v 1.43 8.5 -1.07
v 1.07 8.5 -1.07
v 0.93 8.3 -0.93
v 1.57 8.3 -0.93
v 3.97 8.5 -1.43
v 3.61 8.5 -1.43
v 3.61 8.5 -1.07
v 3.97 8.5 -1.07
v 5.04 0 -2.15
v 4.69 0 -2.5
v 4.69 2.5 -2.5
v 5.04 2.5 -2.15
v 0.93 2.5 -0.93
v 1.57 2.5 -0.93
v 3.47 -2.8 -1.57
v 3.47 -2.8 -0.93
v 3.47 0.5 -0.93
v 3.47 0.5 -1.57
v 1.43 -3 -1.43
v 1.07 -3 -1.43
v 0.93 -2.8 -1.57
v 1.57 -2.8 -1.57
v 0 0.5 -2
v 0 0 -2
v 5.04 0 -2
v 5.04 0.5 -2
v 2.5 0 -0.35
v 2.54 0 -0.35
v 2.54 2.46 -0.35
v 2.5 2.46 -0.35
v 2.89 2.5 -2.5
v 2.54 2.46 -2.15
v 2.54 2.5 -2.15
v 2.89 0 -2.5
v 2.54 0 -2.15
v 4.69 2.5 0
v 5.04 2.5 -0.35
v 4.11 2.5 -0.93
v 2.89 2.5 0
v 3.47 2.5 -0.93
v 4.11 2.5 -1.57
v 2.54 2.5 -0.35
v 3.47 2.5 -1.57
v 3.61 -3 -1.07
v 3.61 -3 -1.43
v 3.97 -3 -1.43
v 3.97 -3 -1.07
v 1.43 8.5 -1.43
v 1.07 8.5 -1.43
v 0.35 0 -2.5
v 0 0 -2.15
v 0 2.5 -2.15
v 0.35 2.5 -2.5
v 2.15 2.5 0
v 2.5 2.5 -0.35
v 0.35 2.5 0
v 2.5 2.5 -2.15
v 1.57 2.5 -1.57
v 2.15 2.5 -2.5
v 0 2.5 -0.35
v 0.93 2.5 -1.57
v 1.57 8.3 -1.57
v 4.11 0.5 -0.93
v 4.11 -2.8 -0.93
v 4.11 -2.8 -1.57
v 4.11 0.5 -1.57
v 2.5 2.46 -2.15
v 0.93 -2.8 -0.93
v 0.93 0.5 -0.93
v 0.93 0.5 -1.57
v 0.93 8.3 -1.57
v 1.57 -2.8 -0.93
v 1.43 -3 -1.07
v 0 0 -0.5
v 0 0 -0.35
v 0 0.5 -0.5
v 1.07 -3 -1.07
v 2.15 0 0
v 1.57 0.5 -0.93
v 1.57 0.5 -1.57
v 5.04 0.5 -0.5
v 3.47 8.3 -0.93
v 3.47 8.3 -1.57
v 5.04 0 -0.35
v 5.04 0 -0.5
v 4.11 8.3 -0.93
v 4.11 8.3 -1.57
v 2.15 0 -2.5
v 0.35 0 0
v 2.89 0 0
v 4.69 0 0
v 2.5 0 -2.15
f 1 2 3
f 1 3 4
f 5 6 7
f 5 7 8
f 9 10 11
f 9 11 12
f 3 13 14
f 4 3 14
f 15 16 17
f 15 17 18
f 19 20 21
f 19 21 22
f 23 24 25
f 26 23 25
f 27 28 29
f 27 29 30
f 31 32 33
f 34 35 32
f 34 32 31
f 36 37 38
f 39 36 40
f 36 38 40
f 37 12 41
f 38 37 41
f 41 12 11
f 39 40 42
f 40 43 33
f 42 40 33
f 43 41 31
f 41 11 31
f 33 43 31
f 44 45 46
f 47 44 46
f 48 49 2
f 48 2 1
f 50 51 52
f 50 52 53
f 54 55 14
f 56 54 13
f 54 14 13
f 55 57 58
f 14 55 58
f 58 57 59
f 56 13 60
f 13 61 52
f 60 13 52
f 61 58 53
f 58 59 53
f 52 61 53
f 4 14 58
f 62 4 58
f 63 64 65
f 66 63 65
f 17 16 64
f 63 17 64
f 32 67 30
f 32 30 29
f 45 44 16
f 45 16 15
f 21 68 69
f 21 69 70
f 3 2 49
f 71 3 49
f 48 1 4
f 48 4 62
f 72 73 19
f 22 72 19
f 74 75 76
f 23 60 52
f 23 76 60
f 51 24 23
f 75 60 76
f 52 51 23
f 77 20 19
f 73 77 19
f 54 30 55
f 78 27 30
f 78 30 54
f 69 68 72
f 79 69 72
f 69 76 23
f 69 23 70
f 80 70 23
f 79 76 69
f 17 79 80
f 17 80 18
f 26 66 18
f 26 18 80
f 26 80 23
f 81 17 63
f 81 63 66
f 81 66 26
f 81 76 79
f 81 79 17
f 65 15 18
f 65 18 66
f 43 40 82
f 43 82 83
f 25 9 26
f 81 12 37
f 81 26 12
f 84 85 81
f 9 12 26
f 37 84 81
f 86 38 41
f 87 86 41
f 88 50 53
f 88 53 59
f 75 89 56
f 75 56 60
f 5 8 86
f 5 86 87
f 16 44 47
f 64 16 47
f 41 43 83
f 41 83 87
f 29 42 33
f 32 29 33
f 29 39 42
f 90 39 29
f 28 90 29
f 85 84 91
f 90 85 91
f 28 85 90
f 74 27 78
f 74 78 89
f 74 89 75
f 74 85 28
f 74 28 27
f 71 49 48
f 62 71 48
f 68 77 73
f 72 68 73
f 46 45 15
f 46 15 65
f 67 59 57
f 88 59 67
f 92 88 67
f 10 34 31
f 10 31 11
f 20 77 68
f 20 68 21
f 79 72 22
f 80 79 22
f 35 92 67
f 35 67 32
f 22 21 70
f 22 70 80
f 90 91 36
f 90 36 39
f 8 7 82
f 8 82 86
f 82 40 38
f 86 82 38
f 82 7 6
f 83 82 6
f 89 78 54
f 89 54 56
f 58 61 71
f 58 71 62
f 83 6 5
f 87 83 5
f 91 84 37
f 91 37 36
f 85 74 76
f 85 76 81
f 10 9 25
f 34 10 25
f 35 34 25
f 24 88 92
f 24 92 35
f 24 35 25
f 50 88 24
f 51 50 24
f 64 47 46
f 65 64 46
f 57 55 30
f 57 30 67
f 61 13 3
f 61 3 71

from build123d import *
from OCP.BRepFilletAPI import BRepFilletAPI_MakeChamfer

# Parameters (mm, degrees)
BOSS_EXTRUDE1_DEPTH         = 2.5
SKETCH2_W                   = 5.04
SKETCH2_H                   = 1.5
CUT_EXTRUDE1_DEPTH          = 0.5
SKETCH4_W                   = 0.04
SKETCH4_H                   = 1.8
CUT_EXTRUDE2_DEPTH          = 0.04
BOSS_EXTRUDE2_START         = -5.5
SKETCH3_W                   = 0.64
SKETCH3_H                   = 0.64
BOSS_EXTRUDE2_DEPTH         = 11.5
CHAMFER1_SIZE               = 0.2
CHAMFER1_SIZE2              = 0.140041508
LPATTERN1_COUNT             = 2
LPATTERN1_PITCH             = 2.54
CHAMFER1_OF_LPATTERN1_SIZE  = 0.2
CHAMFER1_OF_LPATTERN1_SIZE2 = 0.140041508


with BuildPart() as part:
    # Sketch1 → Boss-Extrude1 (new body)
    with BuildSketch(Plane(origin=(0, 0, 0), x_dir=(1, 0, 0), z_dir=(0, 1, 0))):
        Polygon((0, 2.15), (0.35, 2.5), (2.15, 2.5), (2.5, 2.15), (2.54, 2.15), (2.89, 2.5), (4.69, 2.5), (5.04, 2.15), (5.04, 0.35), (4.69, 0), (2.89, 0), (2.54, 0.35), (2.5, 0.35), (2.15, 0), (0.35, 0), (0, 0.35), align=None)
    extrude(amount=BOSS_EXTRUDE1_DEPTH)

    # Sketch2 → Cut-Extrude1 (cut)
    with BuildSketch(Plane.XZ):
        with Locations((2.52, -1.25)):
            Rectangle(SKETCH2_W, SKETCH2_H)
    extrude(amount=-CUT_EXTRUDE1_DEPTH, mode=Mode.SUBTRACT)

    # Sketch4 → Cut-Extrude2 (cut)
    with BuildSketch(Plane(origin=(0, 2.5, 0), x_dir=(1, 0, 0), z_dir=(0, 1, 0))):
        with Locations((5.06, 1.25)):
            Rectangle(SKETCH4_W, SKETCH4_H)
        with Locations((2.52, 1.25)):
            Rectangle(SKETCH4_W, SKETCH4_H)
        with Locations((7.6, 1.25)):
            Rectangle(SKETCH4_W, SKETCH4_H)
        with Locations((10.14, 1.25)):
            Rectangle(SKETCH4_W, SKETCH4_H)
        with Locations((12.68, 1.25)):
            Rectangle(SKETCH4_W, SKETCH4_H)
        with Locations((15.22, 1.25)):
            Rectangle(SKETCH4_W, SKETCH4_H)
        with Locations((17.76, 1.25)):
            Rectangle(SKETCH4_W, SKETCH4_H)
    extrude(amount=-CUT_EXTRUDE2_DEPTH, mode=Mode.SUBTRACT)

    # Sketch3 → Boss-Extrude2 (add)
    with BuildSketch(Plane(origin=(0, 2.5, 0), x_dir=(1, 0, 0), z_dir=(0, 1, 0)).offset(BOSS_EXTRUDE2_START)):
        with Locations((1.25, 1.25)):
            Rectangle(SKETCH3_W, SKETCH3_H)
    boss_extrude2 = extrude(amount=BOSS_EXTRUDE2_DEPTH)

    # Chamfer1: one chamfer whose edges measure the first distance from different faces: ONE call of the kernel's chamfer builder (chamfer() names one face for all edges)
    chamfer1_edges_1 = [part.edges().sort_by_distance(p)[0] for p in [
        (1.57, -3, -1.25),
    ]]
    chamfer1_side_1 = [part.faces().sort_by_distance(p)[0] for p in [
        (1.57, -1.25, -1.25),
    ]]
    chamfer1_edges_2 = [part.edges().sort_by_distance(p)[0] for p in [
        (1.25, -3, -0.93),
    ]]
    chamfer1_side_2 = [part.faces().sort_by_distance(p)[0] for p in [
        (1.25, -1.25, -0.93),
    ]]
    chamfer1_edges_3 = [part.edges().sort_by_distance(p)[0] for p in [
        (0.93, -3, -1.25),
    ]]
    chamfer1_side_3 = [part.faces().sort_by_distance(p)[0] for p in [
        (0.93, -1.25, -1.25),
    ]]
    chamfer1_edges_4 = [part.edges().sort_by_distance(p)[0] for p in [
        (1.25, -3, -1.57),
    ]]
    chamfer1_side_4 = [part.faces().sort_by_distance(p)[0] for p in [
        (1.25, -1.25, -1.57),
    ]]
    chamfer1_edges_5 = [part.edges().sort_by_distance(p)[0] for p in [
        (1.57, 8.5, -1.25),
    ]]
    chamfer1_side_5 = [part.faces().sort_by_distance(p)[0] for p in [
        (1.57, 5.5, -1.25),
    ]]
    chamfer1_edges_6 = [part.edges().sort_by_distance(p)[0] for p in [
        (1.25, 8.5, -1.57),
    ]]
    chamfer1_side_6 = [part.faces().sort_by_distance(p)[0] for p in [
        (1.25, 5.5, -1.57),
    ]]
    chamfer1_edges_7 = [part.edges().sort_by_distance(p)[0] for p in [
        (0.93, 8.5, -1.25),
    ]]
    chamfer1_side_7 = [part.faces().sort_by_distance(p)[0] for p in [
        (0.93, 5.5, -1.25),
    ]]
    chamfer1_edges_8 = [part.edges().sort_by_distance(p)[0] for p in [
        (1.25, 8.5, -0.93),
    ]]
    chamfer1_side_8 = [part.faces().sort_by_distance(p)[0] for p in [
        (1.25, 5.5, -0.93),
    ]]
    chamfer1 = BRepFilletAPI_MakeChamfer(part.part.solid().wrapped)
    for e in chamfer1_edges_1:
        chamfer1.Add(CHAMFER1_SIZE, CHAMFER1_SIZE2, e.wrapped, chamfer1_side_1[0].wrapped)  # the first distance lies on this face
    for e in chamfer1_edges_2:
        chamfer1.Add(CHAMFER1_SIZE, CHAMFER1_SIZE2, e.wrapped, chamfer1_side_2[0].wrapped)  # the first distance lies on this face
    for e in chamfer1_edges_3:
        chamfer1.Add(CHAMFER1_SIZE, CHAMFER1_SIZE2, e.wrapped, chamfer1_side_3[0].wrapped)  # the first distance lies on this face
    for e in chamfer1_edges_4:
        chamfer1.Add(CHAMFER1_SIZE, CHAMFER1_SIZE2, e.wrapped, chamfer1_side_4[0].wrapped)  # the first distance lies on this face
    for e in chamfer1_edges_5:
        chamfer1.Add(CHAMFER1_SIZE, CHAMFER1_SIZE2, e.wrapped, chamfer1_side_5[0].wrapped)  # the first distance lies on this face
    for e in chamfer1_edges_6:
        chamfer1.Add(CHAMFER1_SIZE, CHAMFER1_SIZE2, e.wrapped, chamfer1_side_6[0].wrapped)  # the first distance lies on this face
    for e in chamfer1_edges_7:
        chamfer1.Add(CHAMFER1_SIZE, CHAMFER1_SIZE2, e.wrapped, chamfer1_side_7[0].wrapped)  # the first distance lies on this face
    for e in chamfer1_edges_8:
        chamfer1.Add(CHAMFER1_SIZE, CHAMFER1_SIZE2, e.wrapped, chamfer1_side_8[0].wrapped)  # the first distance lies on this face
    add(Compound.cast(chamfer1.Shape()), mode=Mode.REPLACE)

    # LPattern1: Boss-Extrude2 ×2
    with Locations(*[(i * LPATTERN1_PITCH, 0, 0) for i in range(1, LPATTERN1_COUNT)]):
        add(boss_extrude2)

    # Chamfer1 of LPattern1: one chamfer whose edges measure the first distance from different faces: ONE call of the kernel's chamfer builder (chamfer() names one face for all edges)
    chamfer1_of_lpattern1_edges_1 = [part.edges().sort_by_distance(p)[0] for p in [
        (4.11, -3, -1.25),
    ]]
    chamfer1_of_lpattern1_side_1 = [part.faces().sort_by_distance(p)[0] for p in [
        (4.11, -1.25, -1.25),
    ]]
    chamfer1_of_lpattern1_edges_2 = [part.edges().sort_by_distance(p)[0] for p in [
        (3.79, -3, -0.93),
    ]]
    chamfer1_of_lpattern1_side_2 = [part.faces().sort_by_distance(p)[0] for p in [
        (3.79, -1.25, -0.93),
    ]]
    chamfer1_of_lpattern1_edges_3 = [part.edges().sort_by_distance(p)[0] for p in [
        (3.47, -3, -1.25),
    ]]
    chamfer1_of_lpattern1_side_3 = [part.faces().sort_by_distance(p)[0] for p in [
        (3.47, -1.25, -1.25),
    ]]
    chamfer1_of_lpattern1_edges_4 = [part.edges().sort_by_distance(p)[0] for p in [
        (3.79, -3, -1.57),
    ]]
    chamfer1_of_lpattern1_side_4 = [part.faces().sort_by_distance(p)[0] for p in [
        (3.79, -1.25, -1.57),
    ]]
    chamfer1_of_lpattern1_edges_5 = [part.edges().sort_by_distance(p)[0] for p in [
        (4.11, 8.5, -1.25),
    ]]
    chamfer1_of_lpattern1_side_5 = [part.faces().sort_by_distance(p)[0] for p in [
        (4.11, 5.5, -1.25),
    ]]
    chamfer1_of_lpattern1_edges_6 = [part.edges().sort_by_distance(p)[0] for p in [
        (3.79, 8.5, -1.57),
    ]]
    chamfer1_of_lpattern1_side_6 = [part.faces().sort_by_distance(p)[0] for p in [
        (3.79, 5.5, -1.57),
    ]]
    chamfer1_of_lpattern1_edges_7 = [part.edges().sort_by_distance(p)[0] for p in [
        (3.47, 8.5, -1.25),
    ]]
    chamfer1_of_lpattern1_side_7 = [part.faces().sort_by_distance(p)[0] for p in [
        (3.47, 5.5, -1.25),
    ]]
    chamfer1_of_lpattern1_edges_8 = [part.edges().sort_by_distance(p)[0] for p in [
        (3.79, 8.5, -0.93),
    ]]
    chamfer1_of_lpattern1_side_8 = [part.faces().sort_by_distance(p)[0] for p in [
        (3.79, 5.5, -0.93),
    ]]
    chamfer1_of_lpattern1 = BRepFilletAPI_MakeChamfer(part.part.solid().wrapped)
    for e in chamfer1_of_lpattern1_edges_1:
        chamfer1_of_lpattern1.Add(CHAMFER1_OF_LPATTERN1_SIZE, CHAMFER1_OF_LPATTERN1_SIZE2, e.wrapped, chamfer1_of_lpattern1_side_1[0].wrapped)  # the first distance lies on this face
    for e in chamfer1_of_lpattern1_edges_2:
        chamfer1_of_lpattern1.Add(CHAMFER1_OF_LPATTERN1_SIZE, CHAMFER1_OF_LPATTERN1_SIZE2, e.wrapped, chamfer1_of_lpattern1_side_2[0].wrapped)  # the first distance lies on this face
    for e in chamfer1_of_lpattern1_edges_3:
        chamfer1_of_lpattern1.Add(CHAMFER1_OF_LPATTERN1_SIZE, CHAMFER1_OF_LPATTERN1_SIZE2, e.wrapped, chamfer1_of_lpattern1_side_3[0].wrapped)  # the first distance lies on this face
    for e in chamfer1_of_lpattern1_edges_4:
        chamfer1_of_lpattern1.Add(CHAMFER1_OF_LPATTERN1_SIZE, CHAMFER1_OF_LPATTERN1_SIZE2, e.wrapped, chamfer1_of_lpattern1_side_4[0].wrapped)  # the first distance lies on this face
    for e in chamfer1_of_lpattern1_edges_5:
        chamfer1_of_lpattern1.Add(CHAMFER1_OF_LPATTERN1_SIZE, CHAMFER1_OF_LPATTERN1_SIZE2, e.wrapped, chamfer1_of_lpattern1_side_5[0].wrapped)  # the first distance lies on this face
    for e in chamfer1_of_lpattern1_edges_6:
        chamfer1_of_lpattern1.Add(CHAMFER1_OF_LPATTERN1_SIZE, CHAMFER1_OF_LPATTERN1_SIZE2, e.wrapped, chamfer1_of_lpattern1_side_6[0].wrapped)  # the first distance lies on this face
    for e in chamfer1_of_lpattern1_edges_7:
        chamfer1_of_lpattern1.Add(CHAMFER1_OF_LPATTERN1_SIZE, CHAMFER1_OF_LPATTERN1_SIZE2, e.wrapped, chamfer1_of_lpattern1_side_7[0].wrapped)  # the first distance lies on this face
    for e in chamfer1_of_lpattern1_edges_8:
        chamfer1_of_lpattern1.Add(CHAMFER1_OF_LPATTERN1_SIZE, CHAMFER1_OF_LPATTERN1_SIZE2, e.wrapped, chamfer1_of_lpattern1_side_8[0].wrapped)  # the first distance lies on this face
    add(Compound.cast(chamfer1_of_lpattern1.Shape()), mode=Mode.REPLACE)


solid = part.part
